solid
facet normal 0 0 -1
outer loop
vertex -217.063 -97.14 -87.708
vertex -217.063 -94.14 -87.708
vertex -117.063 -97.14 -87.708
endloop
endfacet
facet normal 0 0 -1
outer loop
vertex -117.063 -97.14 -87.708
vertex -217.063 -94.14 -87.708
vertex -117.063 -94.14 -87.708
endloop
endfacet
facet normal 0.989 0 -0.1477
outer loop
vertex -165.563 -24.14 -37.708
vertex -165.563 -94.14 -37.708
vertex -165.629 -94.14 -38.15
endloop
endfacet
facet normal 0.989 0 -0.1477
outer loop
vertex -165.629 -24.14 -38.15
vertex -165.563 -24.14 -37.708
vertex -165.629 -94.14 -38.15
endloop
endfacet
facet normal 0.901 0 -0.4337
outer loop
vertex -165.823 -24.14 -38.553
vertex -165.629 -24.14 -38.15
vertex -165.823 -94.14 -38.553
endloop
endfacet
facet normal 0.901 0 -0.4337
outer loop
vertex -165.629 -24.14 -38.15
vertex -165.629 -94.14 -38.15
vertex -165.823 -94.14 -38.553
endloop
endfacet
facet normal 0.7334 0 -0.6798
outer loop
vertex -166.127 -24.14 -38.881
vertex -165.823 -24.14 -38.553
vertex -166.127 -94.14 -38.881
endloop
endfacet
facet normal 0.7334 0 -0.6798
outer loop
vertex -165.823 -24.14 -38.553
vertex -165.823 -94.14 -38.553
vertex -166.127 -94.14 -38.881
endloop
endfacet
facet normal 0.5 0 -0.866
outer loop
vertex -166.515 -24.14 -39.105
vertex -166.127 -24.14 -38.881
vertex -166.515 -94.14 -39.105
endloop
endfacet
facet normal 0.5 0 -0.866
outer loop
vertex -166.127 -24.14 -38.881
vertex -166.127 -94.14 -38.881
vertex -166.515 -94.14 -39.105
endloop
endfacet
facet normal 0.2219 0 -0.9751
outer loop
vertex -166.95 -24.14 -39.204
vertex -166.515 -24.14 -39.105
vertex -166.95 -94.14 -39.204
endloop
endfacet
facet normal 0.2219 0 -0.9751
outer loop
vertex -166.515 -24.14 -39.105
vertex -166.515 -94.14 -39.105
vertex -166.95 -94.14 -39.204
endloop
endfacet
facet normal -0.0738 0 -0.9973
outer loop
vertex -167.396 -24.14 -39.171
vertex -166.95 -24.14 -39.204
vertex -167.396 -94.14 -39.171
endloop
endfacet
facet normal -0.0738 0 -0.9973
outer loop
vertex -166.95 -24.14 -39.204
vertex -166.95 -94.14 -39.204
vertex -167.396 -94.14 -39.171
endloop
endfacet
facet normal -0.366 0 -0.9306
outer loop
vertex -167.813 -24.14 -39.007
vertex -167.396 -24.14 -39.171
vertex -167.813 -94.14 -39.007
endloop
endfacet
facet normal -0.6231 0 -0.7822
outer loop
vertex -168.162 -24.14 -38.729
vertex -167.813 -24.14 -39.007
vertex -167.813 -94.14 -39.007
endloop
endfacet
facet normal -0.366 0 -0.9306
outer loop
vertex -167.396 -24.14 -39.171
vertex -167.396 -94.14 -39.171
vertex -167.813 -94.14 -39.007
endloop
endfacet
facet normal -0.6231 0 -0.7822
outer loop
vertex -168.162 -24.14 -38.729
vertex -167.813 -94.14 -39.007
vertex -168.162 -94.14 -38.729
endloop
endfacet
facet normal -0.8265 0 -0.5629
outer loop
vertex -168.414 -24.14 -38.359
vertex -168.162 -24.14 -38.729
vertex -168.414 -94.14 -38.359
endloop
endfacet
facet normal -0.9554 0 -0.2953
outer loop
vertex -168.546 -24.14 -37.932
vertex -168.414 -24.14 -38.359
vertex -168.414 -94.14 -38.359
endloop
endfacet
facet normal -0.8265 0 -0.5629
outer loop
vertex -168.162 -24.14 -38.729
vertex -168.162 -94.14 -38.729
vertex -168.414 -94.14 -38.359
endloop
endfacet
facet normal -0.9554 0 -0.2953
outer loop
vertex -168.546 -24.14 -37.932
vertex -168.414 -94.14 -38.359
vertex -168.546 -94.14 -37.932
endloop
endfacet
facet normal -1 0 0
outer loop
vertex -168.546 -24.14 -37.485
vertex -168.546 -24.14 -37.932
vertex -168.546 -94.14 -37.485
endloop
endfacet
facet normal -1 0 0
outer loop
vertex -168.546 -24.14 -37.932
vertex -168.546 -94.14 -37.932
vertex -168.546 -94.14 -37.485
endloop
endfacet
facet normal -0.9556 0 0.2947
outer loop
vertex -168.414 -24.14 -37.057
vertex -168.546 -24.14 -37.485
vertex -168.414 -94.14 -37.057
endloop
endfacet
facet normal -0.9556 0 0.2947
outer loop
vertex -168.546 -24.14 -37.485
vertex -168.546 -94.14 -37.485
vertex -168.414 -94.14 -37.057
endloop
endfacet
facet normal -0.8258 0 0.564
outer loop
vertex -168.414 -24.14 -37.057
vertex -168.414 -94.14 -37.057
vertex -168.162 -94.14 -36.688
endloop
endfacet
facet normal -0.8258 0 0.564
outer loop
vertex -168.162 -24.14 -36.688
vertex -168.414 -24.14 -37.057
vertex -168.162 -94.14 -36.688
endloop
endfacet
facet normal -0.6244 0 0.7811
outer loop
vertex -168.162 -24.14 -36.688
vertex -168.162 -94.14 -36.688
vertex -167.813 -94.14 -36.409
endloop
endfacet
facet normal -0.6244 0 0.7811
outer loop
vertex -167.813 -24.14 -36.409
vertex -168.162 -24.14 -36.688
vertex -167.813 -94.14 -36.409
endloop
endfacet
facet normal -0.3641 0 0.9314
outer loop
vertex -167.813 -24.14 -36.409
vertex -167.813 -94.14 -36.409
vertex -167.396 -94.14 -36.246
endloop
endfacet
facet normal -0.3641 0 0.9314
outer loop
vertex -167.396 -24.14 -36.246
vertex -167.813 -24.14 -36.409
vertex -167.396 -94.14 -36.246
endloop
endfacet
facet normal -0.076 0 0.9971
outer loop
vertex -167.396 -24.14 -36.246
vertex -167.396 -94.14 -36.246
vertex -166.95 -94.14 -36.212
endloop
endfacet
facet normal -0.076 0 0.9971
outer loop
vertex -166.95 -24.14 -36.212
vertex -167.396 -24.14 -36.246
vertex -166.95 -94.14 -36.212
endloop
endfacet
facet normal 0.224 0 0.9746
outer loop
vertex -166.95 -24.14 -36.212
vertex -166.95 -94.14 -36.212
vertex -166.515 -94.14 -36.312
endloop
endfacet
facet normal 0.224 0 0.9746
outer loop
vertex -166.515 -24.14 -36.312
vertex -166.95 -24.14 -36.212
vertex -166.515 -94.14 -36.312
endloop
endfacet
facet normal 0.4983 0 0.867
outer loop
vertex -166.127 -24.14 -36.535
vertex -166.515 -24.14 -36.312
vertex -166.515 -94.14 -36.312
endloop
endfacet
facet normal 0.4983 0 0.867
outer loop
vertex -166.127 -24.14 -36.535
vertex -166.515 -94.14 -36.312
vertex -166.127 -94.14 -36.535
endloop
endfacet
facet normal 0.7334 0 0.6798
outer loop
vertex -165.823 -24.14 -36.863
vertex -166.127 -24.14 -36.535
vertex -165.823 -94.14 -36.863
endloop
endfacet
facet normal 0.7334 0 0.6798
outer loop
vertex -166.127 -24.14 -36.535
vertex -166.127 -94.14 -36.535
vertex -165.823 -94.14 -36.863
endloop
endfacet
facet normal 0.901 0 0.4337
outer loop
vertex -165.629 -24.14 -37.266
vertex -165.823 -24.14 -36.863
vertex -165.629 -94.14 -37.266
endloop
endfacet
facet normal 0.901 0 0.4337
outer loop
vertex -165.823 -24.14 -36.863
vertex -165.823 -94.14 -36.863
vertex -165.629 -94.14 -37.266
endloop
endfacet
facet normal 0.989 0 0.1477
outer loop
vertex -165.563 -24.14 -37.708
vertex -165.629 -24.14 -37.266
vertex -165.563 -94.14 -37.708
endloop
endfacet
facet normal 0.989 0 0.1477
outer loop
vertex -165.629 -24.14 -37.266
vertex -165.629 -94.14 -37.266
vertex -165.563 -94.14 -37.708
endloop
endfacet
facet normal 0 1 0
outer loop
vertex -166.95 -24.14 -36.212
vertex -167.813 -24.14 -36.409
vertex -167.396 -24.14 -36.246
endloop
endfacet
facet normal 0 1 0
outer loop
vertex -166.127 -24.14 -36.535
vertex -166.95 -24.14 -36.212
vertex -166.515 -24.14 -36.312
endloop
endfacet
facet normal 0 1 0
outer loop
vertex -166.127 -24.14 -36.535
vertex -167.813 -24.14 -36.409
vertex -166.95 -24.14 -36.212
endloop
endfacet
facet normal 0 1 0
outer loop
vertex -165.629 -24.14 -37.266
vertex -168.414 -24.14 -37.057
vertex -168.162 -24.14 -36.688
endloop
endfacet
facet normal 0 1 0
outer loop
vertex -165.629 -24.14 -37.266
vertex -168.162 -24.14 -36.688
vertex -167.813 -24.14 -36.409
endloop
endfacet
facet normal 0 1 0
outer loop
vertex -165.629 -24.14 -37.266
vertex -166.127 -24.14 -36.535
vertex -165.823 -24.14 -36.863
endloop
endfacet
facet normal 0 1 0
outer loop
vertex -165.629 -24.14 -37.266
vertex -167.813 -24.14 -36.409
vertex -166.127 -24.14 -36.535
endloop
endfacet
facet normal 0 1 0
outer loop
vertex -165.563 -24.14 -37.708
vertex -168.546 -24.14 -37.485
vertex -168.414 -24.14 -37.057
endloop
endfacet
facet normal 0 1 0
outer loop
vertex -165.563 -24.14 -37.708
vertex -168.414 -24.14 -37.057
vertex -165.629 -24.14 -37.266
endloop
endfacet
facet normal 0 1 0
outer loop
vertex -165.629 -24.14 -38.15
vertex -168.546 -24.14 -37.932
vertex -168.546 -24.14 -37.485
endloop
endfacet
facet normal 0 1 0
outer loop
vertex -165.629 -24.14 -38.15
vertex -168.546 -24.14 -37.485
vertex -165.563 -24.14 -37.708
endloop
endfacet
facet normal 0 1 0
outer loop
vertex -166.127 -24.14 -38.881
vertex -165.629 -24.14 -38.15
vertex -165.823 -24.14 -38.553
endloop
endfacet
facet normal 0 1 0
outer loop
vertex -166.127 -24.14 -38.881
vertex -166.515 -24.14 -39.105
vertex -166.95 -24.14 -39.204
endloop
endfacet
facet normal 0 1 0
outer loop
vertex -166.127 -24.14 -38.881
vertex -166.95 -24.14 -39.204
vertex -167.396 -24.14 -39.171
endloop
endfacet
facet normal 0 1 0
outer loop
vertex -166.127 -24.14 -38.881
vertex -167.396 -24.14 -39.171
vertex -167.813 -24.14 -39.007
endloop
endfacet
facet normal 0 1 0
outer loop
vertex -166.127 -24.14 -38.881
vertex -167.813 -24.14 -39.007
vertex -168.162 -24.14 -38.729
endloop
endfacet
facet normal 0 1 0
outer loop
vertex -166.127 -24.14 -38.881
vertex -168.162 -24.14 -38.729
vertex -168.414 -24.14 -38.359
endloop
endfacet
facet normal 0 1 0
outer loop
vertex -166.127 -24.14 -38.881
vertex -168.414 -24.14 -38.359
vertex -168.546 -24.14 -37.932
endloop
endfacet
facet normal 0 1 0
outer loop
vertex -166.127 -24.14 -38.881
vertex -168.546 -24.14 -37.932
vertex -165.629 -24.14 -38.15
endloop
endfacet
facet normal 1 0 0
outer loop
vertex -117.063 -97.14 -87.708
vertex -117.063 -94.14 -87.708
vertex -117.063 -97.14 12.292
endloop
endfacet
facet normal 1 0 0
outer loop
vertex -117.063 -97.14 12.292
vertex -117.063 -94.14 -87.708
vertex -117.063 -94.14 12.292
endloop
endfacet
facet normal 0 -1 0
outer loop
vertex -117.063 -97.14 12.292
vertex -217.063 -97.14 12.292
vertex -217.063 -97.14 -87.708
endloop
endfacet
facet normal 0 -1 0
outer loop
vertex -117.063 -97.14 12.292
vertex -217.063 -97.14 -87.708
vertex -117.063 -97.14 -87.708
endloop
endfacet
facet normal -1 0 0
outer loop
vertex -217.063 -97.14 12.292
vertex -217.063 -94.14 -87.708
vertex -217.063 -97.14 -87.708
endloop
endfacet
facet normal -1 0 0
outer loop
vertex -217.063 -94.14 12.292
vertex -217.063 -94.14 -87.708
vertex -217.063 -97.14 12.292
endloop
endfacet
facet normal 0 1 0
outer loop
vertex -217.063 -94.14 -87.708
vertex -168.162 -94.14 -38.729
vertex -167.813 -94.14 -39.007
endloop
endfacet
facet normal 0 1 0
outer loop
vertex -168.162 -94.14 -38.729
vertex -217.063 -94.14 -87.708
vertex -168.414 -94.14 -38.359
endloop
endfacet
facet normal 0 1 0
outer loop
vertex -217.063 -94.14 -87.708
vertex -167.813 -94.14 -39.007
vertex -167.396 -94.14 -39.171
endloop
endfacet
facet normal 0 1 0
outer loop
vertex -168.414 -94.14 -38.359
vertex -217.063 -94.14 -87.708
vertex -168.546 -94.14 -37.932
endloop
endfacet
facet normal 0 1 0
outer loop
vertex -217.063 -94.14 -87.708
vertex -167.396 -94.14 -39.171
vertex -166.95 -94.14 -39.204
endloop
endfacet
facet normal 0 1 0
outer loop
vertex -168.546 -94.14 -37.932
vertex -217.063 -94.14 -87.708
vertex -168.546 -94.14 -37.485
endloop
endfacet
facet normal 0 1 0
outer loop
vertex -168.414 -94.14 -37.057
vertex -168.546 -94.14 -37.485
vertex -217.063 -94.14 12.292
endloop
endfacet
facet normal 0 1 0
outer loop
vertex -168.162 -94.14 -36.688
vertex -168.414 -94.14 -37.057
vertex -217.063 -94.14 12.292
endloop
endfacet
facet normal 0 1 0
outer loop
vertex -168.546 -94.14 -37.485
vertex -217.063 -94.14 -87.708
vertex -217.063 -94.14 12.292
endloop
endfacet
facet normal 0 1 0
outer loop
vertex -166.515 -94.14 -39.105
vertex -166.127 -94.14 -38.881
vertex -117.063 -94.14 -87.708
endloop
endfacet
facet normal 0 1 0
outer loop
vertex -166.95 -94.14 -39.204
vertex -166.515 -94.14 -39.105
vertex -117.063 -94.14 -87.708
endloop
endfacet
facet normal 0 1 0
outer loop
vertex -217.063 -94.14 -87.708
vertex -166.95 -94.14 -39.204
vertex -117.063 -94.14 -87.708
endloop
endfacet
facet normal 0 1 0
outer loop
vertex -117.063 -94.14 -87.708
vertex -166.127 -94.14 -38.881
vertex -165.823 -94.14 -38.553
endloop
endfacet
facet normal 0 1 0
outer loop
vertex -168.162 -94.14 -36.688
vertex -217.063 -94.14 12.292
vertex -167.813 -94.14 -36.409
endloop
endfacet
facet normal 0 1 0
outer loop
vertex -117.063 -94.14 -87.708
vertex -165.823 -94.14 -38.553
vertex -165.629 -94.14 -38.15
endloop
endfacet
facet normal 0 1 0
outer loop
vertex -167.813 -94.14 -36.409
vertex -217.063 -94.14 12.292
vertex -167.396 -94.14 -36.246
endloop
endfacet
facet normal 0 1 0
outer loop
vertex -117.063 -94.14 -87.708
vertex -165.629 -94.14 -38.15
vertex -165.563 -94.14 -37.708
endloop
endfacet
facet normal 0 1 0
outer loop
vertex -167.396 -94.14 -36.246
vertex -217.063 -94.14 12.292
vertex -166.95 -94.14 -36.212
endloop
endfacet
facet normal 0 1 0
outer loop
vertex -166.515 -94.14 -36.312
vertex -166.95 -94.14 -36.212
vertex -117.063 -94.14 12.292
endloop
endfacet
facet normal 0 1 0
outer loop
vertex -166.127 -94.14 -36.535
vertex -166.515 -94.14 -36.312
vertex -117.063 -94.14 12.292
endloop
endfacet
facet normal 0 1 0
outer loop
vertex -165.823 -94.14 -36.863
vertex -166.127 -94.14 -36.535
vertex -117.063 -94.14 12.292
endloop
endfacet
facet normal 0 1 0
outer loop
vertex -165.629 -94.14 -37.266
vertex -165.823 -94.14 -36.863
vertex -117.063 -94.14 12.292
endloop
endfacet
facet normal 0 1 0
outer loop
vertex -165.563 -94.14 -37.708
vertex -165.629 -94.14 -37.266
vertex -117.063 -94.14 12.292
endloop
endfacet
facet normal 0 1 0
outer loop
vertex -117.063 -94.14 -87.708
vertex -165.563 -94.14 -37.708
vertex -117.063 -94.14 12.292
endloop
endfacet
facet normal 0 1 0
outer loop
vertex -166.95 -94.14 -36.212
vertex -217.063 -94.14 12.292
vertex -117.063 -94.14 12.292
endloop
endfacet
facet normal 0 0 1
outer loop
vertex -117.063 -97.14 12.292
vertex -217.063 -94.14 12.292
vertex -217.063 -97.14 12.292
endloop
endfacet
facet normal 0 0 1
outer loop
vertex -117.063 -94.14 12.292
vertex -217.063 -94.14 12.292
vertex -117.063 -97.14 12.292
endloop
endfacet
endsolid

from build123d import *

# Parameters (mm, degrees)
ESTRUSIONE_ESTRUSIONE1_START = 70
SCHIZZO1_W                   = 100
SCHIZZO1_H                   = 100
ESTRUSIONE_ESTRUSIONE1_DEPTH = 3
SCHIZZO2_R                   = 1.5
ESTRUSIONE_ESTRUSIONE2_DEPTH = 70


with BuildPart() as part:
    # Schizzo1 → Estrusione-Estrusione1 (new body)
    with BuildSketch(Plane.XZ.offset(24.14).offset(ESTRUSIONE_ESTRUSIONE1_START)):
        with Locations((-167.062548693, -37.708245302)):
            Rectangle(SCHIZZO1_W, SCHIZZO1_H)
    extrude(amount=ESTRUSIONE_ESTRUSIONE1_DEPTH)

    # Schizzo2 → Estrusione-Estrusione2 (add)
    with BuildSketch(Plane(origin=(0, -94.14, 0), x_dir=(1, 0, 0), z_dir=(0, 1, 0))):
        with Locations((-167.062548693, 37.708245302)):
            Circle(SCHIZZO2_R)
    extrude(amount=ESTRUSIONE_ESTRUSIONE2_DEPTH)


solid = part.part
